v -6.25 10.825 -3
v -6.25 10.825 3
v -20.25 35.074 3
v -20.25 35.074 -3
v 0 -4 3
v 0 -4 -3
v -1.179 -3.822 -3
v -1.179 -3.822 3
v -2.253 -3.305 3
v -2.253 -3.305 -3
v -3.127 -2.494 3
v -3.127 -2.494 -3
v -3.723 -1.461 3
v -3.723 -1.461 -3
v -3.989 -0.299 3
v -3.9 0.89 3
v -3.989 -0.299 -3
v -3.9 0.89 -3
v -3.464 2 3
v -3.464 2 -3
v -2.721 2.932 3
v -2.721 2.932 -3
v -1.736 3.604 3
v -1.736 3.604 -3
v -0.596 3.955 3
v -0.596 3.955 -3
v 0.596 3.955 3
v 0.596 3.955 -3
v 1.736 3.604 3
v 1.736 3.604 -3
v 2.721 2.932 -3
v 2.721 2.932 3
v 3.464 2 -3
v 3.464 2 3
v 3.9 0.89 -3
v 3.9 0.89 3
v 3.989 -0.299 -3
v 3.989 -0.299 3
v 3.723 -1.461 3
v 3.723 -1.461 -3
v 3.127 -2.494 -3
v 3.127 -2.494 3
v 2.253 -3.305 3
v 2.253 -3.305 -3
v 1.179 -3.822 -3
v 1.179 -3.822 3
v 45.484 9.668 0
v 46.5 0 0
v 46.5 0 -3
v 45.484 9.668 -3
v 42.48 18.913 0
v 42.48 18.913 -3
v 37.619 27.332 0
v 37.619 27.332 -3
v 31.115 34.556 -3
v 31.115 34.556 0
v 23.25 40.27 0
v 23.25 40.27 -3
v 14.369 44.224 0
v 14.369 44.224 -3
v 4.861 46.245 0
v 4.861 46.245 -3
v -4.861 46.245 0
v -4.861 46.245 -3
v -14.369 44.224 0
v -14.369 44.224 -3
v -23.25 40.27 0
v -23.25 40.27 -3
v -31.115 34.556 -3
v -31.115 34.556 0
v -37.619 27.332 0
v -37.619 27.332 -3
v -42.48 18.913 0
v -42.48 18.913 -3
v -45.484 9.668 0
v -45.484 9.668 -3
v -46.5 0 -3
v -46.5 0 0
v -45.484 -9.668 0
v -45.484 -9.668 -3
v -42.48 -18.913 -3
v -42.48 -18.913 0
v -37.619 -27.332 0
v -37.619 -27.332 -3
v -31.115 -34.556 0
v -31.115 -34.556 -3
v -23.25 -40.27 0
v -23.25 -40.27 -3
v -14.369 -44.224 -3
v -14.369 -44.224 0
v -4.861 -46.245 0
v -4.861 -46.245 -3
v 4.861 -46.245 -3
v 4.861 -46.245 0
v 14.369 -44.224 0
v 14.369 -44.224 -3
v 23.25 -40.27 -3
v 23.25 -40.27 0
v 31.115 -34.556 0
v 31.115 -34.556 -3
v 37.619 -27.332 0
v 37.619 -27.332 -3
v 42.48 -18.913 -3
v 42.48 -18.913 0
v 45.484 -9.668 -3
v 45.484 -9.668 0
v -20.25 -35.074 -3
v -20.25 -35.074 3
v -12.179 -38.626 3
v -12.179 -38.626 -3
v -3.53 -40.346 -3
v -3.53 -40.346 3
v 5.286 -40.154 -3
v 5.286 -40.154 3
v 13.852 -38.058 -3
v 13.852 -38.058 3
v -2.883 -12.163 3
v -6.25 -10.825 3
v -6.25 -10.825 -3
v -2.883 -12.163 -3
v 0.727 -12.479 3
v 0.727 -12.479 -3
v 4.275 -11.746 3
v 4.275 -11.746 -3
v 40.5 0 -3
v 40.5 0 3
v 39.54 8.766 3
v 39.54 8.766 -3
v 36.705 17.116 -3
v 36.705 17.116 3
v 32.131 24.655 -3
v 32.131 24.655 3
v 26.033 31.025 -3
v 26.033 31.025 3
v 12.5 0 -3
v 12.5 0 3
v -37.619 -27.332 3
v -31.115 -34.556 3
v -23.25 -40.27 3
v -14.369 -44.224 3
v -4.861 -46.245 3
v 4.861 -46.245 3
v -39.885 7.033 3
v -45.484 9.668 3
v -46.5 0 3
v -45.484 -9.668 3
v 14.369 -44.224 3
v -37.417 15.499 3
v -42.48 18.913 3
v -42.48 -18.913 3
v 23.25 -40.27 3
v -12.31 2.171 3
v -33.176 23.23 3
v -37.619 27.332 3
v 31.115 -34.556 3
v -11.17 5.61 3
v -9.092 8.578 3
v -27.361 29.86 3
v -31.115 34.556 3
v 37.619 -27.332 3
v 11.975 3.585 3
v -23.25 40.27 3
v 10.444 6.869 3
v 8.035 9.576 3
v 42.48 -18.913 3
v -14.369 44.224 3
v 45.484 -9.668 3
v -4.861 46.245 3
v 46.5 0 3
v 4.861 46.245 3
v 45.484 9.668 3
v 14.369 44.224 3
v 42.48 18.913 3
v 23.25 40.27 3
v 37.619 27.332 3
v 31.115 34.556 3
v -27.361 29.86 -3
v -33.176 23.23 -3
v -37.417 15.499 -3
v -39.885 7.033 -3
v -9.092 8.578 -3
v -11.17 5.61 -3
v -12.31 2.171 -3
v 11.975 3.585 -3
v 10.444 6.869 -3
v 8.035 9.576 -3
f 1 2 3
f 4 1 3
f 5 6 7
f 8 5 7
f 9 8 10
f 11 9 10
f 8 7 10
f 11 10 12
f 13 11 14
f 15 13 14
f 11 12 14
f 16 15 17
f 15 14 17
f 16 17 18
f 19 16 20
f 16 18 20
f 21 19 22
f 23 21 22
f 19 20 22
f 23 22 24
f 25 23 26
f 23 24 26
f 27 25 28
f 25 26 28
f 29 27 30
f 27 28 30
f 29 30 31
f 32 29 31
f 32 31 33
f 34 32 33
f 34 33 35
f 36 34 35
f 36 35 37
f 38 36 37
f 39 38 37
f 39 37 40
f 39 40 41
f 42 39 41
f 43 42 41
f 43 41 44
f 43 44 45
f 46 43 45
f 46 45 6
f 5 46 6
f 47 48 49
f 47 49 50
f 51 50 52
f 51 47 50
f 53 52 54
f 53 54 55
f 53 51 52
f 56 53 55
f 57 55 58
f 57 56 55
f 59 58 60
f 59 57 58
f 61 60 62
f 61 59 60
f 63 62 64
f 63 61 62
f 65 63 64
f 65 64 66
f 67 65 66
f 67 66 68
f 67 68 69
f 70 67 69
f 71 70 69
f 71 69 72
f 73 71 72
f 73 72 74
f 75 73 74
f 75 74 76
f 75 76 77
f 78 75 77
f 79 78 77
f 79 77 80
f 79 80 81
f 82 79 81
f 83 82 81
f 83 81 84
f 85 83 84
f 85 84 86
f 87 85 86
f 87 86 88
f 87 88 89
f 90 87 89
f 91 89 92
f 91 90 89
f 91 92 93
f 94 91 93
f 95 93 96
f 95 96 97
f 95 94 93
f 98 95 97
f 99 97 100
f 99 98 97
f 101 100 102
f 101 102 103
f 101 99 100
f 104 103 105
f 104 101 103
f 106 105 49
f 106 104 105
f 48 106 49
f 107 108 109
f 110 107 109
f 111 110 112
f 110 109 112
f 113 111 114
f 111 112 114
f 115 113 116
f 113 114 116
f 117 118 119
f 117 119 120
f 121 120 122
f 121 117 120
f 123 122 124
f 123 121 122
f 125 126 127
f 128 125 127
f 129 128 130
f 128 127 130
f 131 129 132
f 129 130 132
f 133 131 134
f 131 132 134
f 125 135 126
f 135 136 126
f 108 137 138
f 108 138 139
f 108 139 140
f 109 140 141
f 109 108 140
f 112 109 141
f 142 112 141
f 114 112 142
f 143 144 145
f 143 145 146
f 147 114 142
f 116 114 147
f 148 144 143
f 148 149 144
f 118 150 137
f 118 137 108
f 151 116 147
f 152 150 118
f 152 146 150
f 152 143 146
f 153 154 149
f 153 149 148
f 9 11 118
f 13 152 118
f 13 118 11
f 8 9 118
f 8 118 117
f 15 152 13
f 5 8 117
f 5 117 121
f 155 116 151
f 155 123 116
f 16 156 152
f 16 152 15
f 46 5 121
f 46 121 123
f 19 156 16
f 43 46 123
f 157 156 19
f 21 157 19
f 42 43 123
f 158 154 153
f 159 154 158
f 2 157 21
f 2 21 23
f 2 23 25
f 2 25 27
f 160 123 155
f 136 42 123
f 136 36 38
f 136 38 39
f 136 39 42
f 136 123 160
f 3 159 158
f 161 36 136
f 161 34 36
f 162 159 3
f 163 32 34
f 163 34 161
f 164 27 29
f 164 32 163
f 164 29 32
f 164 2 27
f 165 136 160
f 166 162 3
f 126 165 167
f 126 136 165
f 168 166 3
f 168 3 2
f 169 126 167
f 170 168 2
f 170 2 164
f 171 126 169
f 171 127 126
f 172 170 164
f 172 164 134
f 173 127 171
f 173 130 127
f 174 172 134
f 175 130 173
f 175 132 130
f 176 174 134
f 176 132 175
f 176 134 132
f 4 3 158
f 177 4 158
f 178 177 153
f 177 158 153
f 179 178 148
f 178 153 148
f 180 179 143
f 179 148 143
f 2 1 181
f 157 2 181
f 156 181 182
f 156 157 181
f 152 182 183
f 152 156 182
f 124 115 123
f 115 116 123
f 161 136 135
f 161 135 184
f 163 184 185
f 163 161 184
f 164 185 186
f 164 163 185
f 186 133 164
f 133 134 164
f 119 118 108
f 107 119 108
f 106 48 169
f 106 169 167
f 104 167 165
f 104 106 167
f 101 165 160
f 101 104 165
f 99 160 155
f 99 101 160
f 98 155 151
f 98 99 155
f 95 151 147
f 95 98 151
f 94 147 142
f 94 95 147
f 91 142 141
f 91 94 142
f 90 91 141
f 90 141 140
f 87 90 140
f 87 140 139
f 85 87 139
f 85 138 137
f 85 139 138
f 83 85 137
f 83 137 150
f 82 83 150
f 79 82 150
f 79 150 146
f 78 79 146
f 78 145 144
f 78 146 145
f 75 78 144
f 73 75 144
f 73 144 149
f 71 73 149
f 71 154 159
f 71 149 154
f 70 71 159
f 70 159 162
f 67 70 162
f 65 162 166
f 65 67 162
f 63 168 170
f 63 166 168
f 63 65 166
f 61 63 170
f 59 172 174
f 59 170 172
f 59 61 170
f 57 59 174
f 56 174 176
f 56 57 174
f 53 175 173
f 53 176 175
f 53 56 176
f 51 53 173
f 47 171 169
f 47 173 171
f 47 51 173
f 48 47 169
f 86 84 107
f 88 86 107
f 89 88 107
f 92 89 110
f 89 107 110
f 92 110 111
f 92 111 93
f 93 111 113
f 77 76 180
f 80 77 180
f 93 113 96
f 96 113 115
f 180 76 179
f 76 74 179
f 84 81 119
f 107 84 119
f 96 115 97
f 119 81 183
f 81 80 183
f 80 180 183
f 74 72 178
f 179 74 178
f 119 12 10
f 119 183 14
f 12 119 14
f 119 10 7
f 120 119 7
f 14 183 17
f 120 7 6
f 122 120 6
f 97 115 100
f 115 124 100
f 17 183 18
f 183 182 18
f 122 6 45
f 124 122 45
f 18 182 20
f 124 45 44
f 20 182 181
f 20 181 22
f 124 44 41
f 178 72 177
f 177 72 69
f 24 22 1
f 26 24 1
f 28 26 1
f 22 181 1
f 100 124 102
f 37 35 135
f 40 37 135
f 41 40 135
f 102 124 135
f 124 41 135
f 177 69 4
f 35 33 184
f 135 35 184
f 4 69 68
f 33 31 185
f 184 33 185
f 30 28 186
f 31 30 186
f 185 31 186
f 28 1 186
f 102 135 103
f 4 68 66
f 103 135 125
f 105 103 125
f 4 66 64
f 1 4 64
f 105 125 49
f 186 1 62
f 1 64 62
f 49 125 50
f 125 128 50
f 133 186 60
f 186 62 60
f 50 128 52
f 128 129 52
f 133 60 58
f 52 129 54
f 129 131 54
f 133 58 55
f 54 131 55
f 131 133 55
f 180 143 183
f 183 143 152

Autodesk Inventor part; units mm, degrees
ref_plane "YZ Plane" through (0, 0, 0) normal (1, 0, 0) x (0, 1, 0)
ref_plane "XZ Plane" through (0, 0, 0) normal (0, 1, 0) x (-1, 0, 0)
ref_plane "XY Plane" through (0, 0, 0) normal (0, 0, 1) x (1, 0, 0)
sketch "Sketch1" plane through (0, 0, 0) normal (0, 0, 1) x (1, 0, 0)
  circle A0 centre (0, 0) radius 46.5 projected
extrude "Extrusion1" add sketch "Sketch1" along normal mid plane 6
sketch "Sketch2" plane through (0, 0, 3) normal (0, 0, 1) x (1, 0, 0)
  circle A0 centre (0, 0) radius 46.5 projected
  circle A1 centre (0, 0) radius 4.5 projected
  arc A2 (17.272, -47.4545) -> (50.5, 0) centre (0, 0) ccw projected
  line L0 (17.272, -47.4545) -> (4.2753, -11.7462) projected
  arc A3 (-6.25, -10.8253) -> (4.2753, -11.7462) centre (0, 0) ccw projected
  line L1 (-6.25, -10.8253) -> (-25.25, -43.7343) projected
  arc A4 (-49.7328, 8.7692) -> (-25.25, -43.7343) centre (0, 0) ccw projected
  line L2 (-49.7328, 8.7692) -> (-12.3101, 2.1706) projected
  arc A5 (-6.25, 10.8253) -> (-12.3101, 2.1706) centre (0, 0) ccw projected
  line L3 (-6.25, 10.8253) -> (-25.25, 43.7343) projected
  arc A6 (32.4608, 38.6852) -> (-25.25, 43.7343) centre (0, 0) ccw projected
  line L4 (32.4608, 38.6852) -> (8.0348, 9.5756) projected
  arc A7 (12.5, 0) -> (8.0348, 9.5756) centre (0, 0) ccw projected
  line L5 (12.5, 0) -> (50.5, 0) projected
  circle A8 centre (0, 0) radius 40.5 construction
  arc A9 (40.5, 0) -> (26.0329, 31.0248) centre (0, 0) ccw
  arc A10 (-20.25, 35.074) -> (-39.8847, 7.0328) centre (0, 0) ccw
  arc A11 (-20.25, -35.074) -> (13.8518, -38.0576) centre (0, 0) ccw
  point P0 (-23.25, -40.2702)
  point P1 (15.9039, -43.6957)
  point P2 (-23.25, 40.2702)
  point P3 (-45.7936, 8.0746)
  point P4 (46.5, 0)
  point P5 (29.8896, 35.6211)
  dimension "d4" = 6
extrude "Extrusion3" cut sketch "Sketch2" against normal through all contours L5 A7 L4 A9 | A11 L1 A3 L0 | L3 A5 L2 A10
sketch "Sketch3" plane through (0, 0, 3) normal (0, 0, 1) x (1, 0, 0)
  circle A0 centre (0, 0) radius 46.5 projected
hole "Hole1" at (0, 0, 3) direction (0, 0, -1) diameter 8 end through all
properties part number "main_wheel"
